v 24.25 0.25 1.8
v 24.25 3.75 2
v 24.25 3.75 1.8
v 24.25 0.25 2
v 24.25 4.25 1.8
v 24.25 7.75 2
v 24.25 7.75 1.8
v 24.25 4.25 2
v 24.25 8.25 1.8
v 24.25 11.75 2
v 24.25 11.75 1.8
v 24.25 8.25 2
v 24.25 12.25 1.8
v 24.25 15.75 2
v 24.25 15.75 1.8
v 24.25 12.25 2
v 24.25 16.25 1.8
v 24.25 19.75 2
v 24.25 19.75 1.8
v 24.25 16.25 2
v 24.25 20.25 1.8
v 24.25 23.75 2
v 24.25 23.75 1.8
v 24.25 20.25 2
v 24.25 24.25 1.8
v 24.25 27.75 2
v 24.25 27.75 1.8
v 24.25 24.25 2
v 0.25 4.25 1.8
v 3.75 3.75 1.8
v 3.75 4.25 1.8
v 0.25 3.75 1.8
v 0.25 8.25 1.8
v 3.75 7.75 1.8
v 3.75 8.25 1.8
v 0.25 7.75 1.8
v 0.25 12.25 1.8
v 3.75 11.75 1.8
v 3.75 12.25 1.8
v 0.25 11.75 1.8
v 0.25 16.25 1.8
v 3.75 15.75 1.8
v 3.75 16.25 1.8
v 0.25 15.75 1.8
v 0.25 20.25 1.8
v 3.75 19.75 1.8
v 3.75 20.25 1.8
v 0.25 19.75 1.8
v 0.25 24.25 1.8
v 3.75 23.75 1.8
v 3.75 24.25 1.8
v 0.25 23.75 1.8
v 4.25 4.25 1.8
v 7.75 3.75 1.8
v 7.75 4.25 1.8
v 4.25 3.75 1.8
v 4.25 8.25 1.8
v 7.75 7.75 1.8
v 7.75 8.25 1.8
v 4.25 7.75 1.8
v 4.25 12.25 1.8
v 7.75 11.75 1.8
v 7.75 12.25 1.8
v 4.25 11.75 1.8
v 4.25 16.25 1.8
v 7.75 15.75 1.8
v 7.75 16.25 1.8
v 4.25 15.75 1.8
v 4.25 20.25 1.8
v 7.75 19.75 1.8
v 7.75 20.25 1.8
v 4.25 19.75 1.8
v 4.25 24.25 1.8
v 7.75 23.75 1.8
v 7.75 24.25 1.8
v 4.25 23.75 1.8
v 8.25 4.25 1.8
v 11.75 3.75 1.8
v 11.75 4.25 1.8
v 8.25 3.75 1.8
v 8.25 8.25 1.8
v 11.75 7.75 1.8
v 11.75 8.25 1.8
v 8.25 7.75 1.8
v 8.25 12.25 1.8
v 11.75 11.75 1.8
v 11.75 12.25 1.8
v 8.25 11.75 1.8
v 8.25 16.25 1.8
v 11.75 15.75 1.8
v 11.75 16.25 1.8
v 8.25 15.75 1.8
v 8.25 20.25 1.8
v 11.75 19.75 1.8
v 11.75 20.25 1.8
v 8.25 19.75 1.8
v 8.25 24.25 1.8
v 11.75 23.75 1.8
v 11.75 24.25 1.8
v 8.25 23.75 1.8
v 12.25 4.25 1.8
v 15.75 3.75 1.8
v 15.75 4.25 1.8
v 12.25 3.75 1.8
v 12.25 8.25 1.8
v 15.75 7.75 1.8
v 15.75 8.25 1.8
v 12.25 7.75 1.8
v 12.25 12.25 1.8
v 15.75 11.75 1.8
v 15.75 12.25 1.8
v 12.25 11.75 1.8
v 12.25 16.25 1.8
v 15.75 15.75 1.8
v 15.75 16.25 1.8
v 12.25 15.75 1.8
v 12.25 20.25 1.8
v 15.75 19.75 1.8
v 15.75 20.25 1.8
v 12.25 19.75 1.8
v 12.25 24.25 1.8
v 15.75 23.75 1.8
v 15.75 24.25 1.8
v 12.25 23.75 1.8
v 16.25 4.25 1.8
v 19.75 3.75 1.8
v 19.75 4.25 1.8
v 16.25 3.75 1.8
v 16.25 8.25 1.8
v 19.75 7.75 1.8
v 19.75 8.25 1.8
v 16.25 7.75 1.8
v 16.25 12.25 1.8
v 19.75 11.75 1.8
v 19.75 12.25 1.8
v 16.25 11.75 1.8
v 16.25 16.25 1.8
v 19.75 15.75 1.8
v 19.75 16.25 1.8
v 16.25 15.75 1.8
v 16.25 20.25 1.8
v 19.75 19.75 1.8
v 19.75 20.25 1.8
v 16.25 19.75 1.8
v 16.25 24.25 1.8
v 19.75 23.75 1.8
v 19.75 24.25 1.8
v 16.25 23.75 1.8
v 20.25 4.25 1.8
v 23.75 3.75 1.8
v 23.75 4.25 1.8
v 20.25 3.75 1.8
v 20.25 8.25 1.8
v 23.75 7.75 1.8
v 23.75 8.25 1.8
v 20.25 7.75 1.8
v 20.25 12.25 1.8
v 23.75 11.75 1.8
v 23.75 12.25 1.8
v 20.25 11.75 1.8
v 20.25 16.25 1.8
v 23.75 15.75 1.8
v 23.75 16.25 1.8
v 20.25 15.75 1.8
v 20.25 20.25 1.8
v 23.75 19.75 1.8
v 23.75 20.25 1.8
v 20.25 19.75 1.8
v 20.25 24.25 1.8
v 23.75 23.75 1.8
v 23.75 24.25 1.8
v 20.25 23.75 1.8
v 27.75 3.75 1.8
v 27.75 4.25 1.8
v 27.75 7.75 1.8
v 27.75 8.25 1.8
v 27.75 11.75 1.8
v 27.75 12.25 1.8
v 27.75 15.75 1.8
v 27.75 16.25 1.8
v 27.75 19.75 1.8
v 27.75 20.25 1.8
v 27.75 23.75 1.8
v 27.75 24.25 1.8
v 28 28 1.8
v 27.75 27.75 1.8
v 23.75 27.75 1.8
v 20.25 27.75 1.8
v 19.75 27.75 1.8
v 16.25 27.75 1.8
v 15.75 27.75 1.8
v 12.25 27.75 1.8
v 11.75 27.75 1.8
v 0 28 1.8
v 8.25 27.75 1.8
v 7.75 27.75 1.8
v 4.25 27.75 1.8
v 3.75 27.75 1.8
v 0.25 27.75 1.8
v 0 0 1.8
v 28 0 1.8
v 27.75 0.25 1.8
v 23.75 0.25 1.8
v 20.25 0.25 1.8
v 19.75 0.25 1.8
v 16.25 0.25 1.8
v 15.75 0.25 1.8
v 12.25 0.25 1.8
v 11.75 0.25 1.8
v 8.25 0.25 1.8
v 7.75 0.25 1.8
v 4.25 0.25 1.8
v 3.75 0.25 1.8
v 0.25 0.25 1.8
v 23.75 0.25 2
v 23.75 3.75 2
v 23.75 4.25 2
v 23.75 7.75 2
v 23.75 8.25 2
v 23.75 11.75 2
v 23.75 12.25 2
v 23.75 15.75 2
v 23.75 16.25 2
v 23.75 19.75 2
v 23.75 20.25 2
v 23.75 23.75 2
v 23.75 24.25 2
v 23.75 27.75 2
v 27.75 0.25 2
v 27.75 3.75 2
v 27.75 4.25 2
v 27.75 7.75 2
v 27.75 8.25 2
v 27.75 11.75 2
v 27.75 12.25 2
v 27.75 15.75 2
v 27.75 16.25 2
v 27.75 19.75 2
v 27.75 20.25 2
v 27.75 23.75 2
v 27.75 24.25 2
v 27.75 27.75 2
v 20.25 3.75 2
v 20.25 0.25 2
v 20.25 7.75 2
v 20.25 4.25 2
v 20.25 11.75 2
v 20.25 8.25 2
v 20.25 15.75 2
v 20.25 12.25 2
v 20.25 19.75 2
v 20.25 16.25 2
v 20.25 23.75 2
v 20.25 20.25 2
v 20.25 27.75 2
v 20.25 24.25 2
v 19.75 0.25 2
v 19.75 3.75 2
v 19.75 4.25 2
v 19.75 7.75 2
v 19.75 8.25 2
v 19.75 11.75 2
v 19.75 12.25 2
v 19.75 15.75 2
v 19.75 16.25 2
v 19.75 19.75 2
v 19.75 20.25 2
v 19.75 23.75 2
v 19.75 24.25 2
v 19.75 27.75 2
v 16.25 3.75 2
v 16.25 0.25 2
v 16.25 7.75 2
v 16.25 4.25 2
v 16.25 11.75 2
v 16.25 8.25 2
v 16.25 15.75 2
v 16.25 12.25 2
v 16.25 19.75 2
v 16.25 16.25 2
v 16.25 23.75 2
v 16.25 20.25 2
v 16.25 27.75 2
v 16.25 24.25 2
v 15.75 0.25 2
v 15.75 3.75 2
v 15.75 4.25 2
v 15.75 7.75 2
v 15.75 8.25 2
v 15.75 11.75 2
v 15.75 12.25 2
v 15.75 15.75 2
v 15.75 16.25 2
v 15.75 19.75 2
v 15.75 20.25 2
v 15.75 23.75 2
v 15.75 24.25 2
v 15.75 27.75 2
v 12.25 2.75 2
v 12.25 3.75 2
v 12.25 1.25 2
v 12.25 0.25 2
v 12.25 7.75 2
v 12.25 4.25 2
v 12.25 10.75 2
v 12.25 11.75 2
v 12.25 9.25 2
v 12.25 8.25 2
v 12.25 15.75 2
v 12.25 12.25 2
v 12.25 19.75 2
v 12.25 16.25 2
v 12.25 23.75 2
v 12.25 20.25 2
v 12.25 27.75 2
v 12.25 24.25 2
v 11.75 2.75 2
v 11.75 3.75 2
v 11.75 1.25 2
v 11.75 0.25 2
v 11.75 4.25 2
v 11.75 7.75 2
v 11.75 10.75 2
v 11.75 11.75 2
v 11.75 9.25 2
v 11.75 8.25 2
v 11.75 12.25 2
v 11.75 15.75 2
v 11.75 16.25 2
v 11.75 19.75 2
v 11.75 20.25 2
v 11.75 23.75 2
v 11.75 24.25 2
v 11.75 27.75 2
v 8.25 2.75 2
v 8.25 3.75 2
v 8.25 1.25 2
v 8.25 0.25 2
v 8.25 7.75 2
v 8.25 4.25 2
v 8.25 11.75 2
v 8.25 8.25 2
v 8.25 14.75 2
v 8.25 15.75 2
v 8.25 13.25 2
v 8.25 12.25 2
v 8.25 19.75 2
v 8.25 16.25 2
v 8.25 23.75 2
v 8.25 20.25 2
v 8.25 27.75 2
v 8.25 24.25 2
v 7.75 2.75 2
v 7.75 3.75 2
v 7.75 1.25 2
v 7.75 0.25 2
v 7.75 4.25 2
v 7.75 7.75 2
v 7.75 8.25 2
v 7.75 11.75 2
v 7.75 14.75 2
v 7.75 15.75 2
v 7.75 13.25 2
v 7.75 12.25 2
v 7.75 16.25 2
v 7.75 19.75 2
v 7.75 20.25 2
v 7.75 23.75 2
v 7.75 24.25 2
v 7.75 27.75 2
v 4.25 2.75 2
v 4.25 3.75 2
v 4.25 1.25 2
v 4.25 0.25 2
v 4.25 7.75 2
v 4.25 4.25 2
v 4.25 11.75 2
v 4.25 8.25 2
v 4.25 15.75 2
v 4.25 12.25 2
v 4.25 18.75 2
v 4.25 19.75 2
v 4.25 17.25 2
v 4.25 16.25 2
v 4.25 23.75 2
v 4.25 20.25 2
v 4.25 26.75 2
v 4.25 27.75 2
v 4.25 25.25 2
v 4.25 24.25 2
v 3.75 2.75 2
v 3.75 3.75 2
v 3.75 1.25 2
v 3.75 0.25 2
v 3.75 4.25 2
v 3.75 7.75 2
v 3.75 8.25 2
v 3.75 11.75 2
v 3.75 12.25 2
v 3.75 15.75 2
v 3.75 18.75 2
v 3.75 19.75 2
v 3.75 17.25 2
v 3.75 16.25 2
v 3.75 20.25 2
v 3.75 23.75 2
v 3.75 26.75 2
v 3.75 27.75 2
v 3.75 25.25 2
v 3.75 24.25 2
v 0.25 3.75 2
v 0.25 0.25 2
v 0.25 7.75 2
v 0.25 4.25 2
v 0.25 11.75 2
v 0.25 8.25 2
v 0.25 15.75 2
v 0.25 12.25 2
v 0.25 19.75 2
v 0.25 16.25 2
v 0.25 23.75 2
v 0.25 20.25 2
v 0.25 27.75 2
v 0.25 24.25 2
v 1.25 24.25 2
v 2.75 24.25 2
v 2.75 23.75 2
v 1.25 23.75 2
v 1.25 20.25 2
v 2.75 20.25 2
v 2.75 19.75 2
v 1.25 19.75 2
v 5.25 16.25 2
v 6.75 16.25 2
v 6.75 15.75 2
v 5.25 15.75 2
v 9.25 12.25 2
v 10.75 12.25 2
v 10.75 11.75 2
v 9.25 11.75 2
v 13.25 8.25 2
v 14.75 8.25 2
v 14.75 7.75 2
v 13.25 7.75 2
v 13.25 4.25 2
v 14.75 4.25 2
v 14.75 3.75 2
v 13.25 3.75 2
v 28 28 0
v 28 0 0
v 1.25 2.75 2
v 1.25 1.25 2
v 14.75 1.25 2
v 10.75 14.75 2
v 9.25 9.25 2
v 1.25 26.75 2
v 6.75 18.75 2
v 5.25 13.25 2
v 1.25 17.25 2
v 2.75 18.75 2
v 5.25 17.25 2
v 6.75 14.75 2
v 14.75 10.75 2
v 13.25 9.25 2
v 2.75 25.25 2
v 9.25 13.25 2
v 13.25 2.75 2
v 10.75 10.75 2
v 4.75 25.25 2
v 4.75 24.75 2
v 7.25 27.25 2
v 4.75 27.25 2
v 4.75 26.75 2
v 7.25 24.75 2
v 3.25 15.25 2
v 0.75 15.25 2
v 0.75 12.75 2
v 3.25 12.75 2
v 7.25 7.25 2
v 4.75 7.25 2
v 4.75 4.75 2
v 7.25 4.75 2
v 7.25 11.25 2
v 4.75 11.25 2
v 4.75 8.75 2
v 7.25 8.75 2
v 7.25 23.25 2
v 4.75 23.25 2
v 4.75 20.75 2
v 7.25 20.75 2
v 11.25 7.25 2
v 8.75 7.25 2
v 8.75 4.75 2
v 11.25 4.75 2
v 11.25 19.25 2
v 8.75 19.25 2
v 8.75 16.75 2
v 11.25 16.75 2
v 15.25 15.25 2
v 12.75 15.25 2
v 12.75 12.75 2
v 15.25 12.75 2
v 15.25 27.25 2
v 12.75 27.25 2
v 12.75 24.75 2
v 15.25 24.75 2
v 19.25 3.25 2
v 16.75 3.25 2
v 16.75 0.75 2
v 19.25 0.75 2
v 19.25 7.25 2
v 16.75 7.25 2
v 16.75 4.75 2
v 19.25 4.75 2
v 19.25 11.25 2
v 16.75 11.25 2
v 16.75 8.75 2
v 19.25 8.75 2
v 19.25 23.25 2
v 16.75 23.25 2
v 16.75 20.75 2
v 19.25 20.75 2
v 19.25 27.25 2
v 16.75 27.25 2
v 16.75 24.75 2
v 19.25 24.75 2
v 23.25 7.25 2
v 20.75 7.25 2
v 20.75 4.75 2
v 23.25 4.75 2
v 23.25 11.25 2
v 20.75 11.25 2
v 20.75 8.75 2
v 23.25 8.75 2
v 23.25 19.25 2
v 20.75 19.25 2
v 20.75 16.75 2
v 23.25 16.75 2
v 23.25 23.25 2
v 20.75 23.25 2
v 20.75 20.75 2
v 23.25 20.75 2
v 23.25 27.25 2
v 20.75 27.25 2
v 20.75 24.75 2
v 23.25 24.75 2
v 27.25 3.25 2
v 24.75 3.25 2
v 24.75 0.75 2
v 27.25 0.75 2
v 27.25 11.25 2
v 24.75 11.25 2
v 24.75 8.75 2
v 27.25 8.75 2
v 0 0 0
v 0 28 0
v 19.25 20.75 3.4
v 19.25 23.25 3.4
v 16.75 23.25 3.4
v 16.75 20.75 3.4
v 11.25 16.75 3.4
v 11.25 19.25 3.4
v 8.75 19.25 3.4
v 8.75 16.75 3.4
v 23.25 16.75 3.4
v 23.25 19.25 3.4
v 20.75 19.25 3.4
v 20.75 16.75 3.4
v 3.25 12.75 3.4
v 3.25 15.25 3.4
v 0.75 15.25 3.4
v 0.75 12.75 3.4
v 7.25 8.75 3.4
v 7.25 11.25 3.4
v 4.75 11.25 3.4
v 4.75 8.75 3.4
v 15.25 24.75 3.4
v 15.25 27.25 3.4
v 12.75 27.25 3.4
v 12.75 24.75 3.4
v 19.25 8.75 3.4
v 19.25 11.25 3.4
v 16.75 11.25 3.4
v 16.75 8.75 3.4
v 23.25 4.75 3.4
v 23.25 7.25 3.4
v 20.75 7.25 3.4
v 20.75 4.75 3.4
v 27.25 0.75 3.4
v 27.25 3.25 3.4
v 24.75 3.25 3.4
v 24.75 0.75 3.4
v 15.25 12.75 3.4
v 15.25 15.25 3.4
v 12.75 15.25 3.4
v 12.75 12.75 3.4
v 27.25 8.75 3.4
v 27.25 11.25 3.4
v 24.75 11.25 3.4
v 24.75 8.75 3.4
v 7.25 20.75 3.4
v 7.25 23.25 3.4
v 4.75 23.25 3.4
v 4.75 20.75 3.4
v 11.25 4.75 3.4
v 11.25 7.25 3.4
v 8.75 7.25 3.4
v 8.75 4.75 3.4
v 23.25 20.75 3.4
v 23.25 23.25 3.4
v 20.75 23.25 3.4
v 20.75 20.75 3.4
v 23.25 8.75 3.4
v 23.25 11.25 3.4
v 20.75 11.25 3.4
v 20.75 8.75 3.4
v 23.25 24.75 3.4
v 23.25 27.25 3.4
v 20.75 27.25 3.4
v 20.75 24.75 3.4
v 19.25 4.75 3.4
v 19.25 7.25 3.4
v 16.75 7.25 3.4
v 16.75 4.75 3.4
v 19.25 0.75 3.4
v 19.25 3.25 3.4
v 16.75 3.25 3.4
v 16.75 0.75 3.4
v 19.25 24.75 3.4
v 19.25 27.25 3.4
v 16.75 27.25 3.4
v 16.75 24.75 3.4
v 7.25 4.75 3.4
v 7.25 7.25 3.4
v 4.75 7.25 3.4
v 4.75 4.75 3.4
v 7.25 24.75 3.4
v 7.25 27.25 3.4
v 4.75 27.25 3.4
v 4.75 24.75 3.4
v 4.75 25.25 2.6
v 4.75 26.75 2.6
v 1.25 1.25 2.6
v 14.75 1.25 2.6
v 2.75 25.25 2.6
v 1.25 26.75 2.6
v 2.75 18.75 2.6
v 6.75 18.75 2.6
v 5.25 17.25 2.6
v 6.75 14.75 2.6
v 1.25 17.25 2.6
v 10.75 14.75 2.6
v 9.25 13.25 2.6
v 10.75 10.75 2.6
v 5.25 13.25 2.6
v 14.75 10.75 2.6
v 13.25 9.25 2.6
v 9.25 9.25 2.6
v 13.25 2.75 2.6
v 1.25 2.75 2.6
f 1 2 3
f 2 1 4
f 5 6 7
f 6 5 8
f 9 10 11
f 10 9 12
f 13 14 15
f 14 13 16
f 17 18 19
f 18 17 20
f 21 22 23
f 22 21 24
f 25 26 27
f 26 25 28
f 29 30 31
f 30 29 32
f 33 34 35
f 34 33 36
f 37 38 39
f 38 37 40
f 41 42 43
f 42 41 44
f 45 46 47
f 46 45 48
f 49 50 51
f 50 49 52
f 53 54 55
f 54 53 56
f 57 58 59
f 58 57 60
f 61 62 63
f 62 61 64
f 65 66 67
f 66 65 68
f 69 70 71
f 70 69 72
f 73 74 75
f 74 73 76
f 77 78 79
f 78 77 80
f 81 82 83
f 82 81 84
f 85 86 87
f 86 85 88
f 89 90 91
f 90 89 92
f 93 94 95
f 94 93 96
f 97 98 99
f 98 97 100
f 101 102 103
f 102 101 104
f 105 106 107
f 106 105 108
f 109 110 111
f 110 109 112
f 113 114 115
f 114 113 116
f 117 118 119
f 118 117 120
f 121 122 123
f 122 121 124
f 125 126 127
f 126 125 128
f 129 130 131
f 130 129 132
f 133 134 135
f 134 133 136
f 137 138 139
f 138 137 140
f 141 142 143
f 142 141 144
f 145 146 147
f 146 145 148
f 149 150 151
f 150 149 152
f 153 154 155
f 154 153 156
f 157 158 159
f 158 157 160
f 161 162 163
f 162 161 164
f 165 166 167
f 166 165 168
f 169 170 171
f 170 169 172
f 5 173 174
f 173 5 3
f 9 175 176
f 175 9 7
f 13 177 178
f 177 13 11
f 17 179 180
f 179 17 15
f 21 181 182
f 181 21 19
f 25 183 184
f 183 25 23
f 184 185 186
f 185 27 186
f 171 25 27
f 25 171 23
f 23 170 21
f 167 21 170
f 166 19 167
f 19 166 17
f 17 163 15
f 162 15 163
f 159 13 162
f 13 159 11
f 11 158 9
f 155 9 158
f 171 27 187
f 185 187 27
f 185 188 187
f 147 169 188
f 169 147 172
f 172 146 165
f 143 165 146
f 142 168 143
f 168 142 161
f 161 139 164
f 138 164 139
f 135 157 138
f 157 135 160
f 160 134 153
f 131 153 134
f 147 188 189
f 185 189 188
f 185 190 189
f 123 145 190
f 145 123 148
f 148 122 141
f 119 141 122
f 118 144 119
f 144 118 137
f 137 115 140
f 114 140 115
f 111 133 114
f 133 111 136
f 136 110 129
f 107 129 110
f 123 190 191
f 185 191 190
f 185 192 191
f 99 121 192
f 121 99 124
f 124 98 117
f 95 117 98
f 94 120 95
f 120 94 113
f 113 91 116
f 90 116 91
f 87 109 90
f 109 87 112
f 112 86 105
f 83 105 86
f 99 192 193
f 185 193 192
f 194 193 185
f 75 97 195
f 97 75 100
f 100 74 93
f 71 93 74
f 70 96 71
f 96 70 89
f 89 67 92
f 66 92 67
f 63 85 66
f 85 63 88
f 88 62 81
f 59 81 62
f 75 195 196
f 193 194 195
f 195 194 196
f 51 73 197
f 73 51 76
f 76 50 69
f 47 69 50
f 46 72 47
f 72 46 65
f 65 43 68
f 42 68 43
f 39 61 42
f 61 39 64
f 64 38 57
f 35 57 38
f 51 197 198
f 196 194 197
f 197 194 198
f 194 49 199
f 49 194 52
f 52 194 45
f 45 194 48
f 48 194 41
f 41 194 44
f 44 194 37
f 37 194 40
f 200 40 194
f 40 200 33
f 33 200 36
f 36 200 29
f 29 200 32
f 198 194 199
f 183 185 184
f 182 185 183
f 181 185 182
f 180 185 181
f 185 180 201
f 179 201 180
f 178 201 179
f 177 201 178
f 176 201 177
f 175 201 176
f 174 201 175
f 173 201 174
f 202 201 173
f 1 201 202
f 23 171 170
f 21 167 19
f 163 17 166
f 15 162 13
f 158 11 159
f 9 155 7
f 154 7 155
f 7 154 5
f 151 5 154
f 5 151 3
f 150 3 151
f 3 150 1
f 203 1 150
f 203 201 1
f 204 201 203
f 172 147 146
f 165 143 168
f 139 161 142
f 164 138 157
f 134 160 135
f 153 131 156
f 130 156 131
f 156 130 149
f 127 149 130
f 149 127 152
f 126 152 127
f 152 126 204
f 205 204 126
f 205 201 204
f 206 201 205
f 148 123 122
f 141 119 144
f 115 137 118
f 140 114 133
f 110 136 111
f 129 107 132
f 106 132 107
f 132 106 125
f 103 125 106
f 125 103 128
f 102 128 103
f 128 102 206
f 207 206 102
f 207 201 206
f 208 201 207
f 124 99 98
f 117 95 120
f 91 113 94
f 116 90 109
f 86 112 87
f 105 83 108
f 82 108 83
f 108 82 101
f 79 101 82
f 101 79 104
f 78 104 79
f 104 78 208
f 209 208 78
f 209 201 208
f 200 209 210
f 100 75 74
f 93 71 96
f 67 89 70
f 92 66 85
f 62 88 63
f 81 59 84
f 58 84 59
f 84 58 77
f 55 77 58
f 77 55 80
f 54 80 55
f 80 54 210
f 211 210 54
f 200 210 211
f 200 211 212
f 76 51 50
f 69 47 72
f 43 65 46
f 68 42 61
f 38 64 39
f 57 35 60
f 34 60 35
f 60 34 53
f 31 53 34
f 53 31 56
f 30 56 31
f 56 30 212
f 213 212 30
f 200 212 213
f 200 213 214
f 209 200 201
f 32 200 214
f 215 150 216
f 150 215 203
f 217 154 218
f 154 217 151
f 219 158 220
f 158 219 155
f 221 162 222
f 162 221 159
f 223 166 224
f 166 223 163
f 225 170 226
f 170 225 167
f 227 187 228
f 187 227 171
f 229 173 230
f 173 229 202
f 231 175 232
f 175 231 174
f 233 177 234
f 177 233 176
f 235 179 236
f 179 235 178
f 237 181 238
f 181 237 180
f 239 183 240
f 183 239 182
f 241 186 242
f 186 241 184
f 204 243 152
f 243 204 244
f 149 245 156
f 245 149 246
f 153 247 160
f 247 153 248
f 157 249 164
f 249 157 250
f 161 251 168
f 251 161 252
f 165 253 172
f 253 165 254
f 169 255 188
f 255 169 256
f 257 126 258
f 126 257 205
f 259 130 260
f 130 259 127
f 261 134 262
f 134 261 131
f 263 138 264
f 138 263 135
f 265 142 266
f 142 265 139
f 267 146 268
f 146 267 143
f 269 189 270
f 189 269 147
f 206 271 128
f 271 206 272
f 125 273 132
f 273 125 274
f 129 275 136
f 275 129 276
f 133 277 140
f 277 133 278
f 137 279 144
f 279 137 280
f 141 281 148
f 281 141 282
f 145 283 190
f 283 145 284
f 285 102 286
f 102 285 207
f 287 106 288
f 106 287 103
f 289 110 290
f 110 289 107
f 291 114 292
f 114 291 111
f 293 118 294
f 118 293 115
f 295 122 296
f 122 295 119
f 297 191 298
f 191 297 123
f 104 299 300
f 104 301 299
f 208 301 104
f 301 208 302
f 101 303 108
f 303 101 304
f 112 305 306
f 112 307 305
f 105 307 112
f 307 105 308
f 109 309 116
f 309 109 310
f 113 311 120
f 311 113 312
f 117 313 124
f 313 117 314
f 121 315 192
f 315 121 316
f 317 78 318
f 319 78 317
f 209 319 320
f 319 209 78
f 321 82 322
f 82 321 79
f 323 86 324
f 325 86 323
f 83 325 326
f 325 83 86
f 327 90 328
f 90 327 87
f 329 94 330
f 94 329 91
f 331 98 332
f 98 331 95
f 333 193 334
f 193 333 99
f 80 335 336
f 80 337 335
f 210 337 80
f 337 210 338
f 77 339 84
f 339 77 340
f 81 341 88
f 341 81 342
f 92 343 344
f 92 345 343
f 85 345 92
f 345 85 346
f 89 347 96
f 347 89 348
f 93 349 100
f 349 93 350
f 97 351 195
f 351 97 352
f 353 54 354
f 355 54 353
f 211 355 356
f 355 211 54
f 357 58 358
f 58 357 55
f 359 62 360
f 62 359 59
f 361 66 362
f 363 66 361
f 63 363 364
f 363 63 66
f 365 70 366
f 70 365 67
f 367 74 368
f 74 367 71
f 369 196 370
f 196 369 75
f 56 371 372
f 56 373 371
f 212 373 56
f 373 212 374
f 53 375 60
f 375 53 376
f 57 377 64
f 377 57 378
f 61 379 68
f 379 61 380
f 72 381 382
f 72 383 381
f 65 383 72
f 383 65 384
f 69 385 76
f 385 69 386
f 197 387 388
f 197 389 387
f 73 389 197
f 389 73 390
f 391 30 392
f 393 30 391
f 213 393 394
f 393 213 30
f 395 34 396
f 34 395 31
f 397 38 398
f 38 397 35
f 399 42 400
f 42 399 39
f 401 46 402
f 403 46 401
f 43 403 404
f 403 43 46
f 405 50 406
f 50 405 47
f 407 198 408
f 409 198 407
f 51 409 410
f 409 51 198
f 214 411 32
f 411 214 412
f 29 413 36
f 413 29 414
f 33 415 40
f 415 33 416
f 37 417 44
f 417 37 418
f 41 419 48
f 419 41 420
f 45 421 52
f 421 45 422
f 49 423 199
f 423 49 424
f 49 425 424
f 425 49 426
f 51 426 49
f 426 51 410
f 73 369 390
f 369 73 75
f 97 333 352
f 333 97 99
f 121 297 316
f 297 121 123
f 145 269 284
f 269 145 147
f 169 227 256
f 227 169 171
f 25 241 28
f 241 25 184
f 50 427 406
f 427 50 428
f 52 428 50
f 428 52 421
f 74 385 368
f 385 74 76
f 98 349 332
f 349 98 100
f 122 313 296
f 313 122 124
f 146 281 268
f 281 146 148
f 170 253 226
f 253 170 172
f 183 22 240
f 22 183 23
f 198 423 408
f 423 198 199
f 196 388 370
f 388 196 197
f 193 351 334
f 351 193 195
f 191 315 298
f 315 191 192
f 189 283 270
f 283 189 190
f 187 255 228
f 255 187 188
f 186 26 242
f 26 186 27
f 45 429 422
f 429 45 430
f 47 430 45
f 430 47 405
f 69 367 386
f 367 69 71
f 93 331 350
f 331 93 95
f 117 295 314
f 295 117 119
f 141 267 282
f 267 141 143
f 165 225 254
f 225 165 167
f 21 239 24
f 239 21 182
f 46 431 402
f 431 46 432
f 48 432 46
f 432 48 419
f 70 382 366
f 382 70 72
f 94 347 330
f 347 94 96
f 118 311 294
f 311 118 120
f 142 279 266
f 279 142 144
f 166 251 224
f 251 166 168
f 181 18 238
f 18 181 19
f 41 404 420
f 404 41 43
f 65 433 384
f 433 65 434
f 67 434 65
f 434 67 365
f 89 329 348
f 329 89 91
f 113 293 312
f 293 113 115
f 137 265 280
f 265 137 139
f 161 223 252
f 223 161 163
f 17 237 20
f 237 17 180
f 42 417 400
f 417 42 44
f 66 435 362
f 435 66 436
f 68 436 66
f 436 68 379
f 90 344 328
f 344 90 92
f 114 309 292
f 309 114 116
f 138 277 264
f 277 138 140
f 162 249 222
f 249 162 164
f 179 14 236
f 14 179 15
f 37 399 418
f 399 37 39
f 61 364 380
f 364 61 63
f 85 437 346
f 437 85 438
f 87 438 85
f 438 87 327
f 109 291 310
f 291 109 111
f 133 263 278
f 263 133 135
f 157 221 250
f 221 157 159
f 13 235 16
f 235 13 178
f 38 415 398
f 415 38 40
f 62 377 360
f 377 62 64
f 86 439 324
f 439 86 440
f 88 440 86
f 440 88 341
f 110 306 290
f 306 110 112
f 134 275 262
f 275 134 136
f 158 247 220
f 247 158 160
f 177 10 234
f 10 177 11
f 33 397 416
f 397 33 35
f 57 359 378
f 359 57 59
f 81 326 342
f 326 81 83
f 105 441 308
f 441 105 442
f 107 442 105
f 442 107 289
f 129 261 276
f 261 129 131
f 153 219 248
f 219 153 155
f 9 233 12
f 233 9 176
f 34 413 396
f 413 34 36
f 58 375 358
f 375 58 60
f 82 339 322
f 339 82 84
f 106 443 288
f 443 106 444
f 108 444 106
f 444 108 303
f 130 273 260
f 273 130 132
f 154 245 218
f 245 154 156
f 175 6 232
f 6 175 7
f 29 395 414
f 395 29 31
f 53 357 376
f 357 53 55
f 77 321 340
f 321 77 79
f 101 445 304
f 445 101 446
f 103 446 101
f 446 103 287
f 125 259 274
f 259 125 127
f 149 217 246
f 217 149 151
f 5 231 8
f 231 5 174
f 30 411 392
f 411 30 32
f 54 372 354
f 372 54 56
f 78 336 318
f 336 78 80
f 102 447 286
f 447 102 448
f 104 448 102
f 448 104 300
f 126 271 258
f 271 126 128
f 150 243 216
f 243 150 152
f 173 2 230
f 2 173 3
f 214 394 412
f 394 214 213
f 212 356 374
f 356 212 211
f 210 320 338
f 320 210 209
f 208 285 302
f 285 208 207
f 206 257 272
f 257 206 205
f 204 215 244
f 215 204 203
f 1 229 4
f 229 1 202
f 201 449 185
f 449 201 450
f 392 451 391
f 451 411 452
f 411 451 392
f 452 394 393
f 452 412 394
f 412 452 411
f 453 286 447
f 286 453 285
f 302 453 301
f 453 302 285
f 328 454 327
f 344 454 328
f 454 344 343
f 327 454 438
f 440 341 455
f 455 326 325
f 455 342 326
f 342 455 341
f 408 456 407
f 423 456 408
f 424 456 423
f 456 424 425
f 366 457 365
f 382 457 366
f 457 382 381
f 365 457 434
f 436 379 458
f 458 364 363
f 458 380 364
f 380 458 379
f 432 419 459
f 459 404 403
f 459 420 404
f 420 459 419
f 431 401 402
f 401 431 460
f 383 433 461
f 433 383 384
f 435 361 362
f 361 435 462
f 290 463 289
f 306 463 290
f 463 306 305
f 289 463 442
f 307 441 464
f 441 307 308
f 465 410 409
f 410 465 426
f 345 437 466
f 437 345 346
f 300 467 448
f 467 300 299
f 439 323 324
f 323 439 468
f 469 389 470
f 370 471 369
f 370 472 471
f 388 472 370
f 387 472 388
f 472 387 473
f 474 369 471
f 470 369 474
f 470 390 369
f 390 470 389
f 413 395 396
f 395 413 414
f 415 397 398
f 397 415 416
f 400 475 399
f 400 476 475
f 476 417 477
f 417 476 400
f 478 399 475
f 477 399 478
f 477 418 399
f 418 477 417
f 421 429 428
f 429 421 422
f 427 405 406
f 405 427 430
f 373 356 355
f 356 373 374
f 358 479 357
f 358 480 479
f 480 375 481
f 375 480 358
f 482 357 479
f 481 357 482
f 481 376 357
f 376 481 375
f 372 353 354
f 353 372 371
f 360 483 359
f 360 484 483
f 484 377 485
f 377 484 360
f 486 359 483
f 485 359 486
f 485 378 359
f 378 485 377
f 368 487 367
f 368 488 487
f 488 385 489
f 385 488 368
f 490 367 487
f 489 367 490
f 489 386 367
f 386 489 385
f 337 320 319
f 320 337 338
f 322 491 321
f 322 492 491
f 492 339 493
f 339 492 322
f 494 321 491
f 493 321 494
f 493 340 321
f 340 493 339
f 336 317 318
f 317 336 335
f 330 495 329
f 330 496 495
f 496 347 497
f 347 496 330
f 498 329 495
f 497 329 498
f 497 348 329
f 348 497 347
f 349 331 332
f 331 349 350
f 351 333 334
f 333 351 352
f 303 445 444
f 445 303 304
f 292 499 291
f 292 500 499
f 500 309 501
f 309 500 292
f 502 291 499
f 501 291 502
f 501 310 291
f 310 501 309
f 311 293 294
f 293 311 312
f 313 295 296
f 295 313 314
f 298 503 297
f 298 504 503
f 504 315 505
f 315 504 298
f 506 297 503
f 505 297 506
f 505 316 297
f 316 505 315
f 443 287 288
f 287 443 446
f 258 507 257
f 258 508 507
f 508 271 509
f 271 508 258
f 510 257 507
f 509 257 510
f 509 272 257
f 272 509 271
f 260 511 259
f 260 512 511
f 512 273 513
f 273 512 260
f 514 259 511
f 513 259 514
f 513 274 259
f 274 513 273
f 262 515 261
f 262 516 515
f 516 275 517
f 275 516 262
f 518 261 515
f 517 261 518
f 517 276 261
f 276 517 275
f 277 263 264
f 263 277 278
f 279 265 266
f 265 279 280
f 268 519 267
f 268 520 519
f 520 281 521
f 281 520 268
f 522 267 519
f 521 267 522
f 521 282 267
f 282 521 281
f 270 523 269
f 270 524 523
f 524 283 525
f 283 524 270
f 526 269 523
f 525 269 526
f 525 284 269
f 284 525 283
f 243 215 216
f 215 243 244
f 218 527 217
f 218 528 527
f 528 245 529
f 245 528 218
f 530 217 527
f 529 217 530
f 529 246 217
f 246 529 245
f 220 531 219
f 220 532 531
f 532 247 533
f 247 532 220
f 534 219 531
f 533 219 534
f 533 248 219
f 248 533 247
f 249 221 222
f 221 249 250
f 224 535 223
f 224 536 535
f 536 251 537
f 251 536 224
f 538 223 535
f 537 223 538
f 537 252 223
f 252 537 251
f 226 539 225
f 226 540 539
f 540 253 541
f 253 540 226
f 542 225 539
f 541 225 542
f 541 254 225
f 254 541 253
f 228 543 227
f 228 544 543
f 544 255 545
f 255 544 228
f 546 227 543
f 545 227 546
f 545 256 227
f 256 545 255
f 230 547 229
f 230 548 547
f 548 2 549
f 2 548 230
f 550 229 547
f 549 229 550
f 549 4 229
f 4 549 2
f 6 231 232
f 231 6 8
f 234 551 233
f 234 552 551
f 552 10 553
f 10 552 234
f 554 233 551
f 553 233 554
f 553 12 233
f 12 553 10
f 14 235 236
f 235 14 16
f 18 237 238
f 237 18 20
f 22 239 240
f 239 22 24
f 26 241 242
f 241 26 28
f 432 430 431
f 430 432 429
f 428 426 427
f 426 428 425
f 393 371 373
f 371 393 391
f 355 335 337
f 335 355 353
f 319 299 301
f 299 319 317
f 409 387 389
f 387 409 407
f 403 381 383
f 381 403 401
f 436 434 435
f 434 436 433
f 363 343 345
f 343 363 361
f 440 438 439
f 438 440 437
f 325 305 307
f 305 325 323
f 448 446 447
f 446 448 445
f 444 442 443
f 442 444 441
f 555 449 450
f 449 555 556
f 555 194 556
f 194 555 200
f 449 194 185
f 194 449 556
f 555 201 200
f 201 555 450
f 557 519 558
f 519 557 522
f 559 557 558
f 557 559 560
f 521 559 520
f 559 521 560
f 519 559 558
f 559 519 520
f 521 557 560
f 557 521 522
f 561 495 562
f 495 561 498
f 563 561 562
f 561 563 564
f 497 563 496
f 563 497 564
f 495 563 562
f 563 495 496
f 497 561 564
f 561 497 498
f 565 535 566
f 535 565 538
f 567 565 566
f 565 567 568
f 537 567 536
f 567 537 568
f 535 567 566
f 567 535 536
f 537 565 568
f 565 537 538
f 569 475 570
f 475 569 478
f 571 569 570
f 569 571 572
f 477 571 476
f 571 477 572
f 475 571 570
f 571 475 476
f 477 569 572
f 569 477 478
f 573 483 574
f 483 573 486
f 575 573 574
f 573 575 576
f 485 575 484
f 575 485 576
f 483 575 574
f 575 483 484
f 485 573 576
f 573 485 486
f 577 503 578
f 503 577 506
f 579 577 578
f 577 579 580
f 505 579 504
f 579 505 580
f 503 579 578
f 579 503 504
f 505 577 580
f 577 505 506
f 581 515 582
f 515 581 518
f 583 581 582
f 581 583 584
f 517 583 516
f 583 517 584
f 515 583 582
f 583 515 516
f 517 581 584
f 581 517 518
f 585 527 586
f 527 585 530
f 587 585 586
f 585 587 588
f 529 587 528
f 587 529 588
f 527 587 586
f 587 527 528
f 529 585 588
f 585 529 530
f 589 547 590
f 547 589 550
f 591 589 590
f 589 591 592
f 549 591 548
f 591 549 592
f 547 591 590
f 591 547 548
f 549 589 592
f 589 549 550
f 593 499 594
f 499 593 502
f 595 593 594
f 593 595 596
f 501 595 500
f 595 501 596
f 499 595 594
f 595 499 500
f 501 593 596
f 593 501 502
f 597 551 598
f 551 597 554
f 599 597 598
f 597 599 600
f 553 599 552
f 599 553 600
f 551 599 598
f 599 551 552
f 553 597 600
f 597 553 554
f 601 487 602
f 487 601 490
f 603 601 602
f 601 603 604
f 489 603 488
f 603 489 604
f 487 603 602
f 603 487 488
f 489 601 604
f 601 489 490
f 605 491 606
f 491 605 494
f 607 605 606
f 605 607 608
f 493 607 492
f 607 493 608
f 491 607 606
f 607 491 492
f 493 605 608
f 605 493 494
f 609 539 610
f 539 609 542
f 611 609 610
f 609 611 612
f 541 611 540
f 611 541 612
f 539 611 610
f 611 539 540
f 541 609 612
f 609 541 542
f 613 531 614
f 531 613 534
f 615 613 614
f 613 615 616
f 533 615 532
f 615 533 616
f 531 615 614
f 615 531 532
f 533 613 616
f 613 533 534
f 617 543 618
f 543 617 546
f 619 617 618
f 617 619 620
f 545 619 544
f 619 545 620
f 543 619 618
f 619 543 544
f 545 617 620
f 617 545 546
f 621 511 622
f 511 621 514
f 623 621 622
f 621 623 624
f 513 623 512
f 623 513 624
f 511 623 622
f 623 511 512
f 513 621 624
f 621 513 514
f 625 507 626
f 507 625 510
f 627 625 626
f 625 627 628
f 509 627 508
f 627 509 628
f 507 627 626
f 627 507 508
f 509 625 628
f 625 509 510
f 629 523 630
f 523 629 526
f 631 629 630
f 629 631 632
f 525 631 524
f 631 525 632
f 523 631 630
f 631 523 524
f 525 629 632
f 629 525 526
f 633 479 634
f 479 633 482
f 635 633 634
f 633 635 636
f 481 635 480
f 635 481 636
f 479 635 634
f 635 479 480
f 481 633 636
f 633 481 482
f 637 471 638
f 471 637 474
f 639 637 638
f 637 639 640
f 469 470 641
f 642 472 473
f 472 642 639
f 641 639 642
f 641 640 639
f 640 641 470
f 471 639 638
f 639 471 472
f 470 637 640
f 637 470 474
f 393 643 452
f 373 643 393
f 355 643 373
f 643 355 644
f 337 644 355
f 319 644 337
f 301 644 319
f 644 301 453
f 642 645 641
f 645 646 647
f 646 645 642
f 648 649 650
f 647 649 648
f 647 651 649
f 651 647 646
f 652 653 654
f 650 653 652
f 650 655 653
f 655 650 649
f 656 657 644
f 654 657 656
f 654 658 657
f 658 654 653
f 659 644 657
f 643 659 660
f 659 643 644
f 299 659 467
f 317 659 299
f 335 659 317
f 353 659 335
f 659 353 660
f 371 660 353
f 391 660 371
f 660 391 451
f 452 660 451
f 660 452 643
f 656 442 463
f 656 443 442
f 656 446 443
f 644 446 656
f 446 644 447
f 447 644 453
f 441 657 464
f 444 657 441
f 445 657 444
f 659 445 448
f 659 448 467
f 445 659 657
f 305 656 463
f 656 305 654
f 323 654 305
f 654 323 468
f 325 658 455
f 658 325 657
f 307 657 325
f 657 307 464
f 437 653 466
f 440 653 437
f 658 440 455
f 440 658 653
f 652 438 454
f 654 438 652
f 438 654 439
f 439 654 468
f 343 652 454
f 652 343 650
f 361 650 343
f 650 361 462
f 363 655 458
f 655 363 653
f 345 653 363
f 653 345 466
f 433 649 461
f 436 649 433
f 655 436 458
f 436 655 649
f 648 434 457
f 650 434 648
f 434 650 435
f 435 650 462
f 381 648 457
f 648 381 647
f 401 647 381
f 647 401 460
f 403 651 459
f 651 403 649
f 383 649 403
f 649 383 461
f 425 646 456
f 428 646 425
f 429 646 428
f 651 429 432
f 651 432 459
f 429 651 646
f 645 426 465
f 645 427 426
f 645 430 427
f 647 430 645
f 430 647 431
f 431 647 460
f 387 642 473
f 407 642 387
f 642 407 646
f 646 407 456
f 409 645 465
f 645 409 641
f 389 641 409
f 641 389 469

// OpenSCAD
//==================================================================================
//
//               Advent Of Code 2024 - Day 18 - Visualisation
//
// Author:  Heath Raftery
// Origin:  https://github.com/hraftery/aoc2024/blob/main/src/days/day18.scad
// License: Creative Commons - Attribution - Share Alike
//
// See Reddit for discussion: https://www.reddit.com/r/adventofcode/comments/1hhln7j/2024_day_18_part_2_openscad_into_the_third/
//
//==================================================================================


//===========
// Constants
//===========

//NOTE: width is in y direction, length is in x direction, height is in z direction
//      thickness is in direction perpendicular to its length.
base_h = 2;
wall_t = 0.5;
wall_h = -0.2;
cell_w = 4;
cell_l = cell_w;
byte_w = 2.5;
byte_l = byte_w;
byte_h = 1.4;
path_t = 1.5;
path_h = 0.6;
blocker_h = 4;
tol = 0.001;


//========
//  Data
//========

//NOTE: To put the OpenSCAD orgin at the top left, the x and y axes swapped.
//      So num_cols is in the OpenSCAD y direction and locs are interpreted in [y,x] order.
example = true;
num_cols = example ? 7 : 71;
num_rows = num_cols;
byte_locs = example ?
  [ [5,4], [4,2], [4,5], [3,0], [2,1], [6,3], [2,4], [1,5], [0,6], [3,3], [2,6], [5,1], [1,2], [5,5], [2,5], [6,5], [1,4], [0,4], [6,4], [1,1], [6,1] ] :
  [ /* your input data here */ ];
path_locs = example ?
  [ [0,0], [0,1], [0,2], [0,3], [1,3], [2,3], [2,2], [3,2], [3,1], [4,1], [4, 0], [5, 0], [6, 0], [6, 1] ] :
  [ /* your calculated path here */ ];


//===========
// Functions
//===========

function arg(p0, p1) = atan2(p1[1]-p0[1], p1[0]-p0[0]);


//=========
// Modules
//=========

module walls(t, h) {
  intersection() {
    union() {
      walls_w(t, h, 0);
      walls_l(t, h, 0);
    }
    translate([-tol, -tol, -tol])
      cube([num_rows*cell_l + 2*tol, num_cols*cell_w + 2*tol, h + 2*tol]);
  }
}

module walls_w(t, h, index) {
  translate([-t/2, -tol, 0])
    cube([t, num_cols*cell_w + 2*tol, h+tol]);
  if(index < num_rows) {
    translate([cell_l, 0, 0])
      walls_w(t, h, index + 1);
  }
}

module walls_l(t, h, index) {
  translate([-tol, -t/2, 0])
    cube([num_rows*cell_l + 2*tol, t, h+tol]);
  if(index < num_cols) {
    translate([0, cell_w, 0])
      walls_l(t, h, index + 1);
  }
}

module bytes(w, l) {
  for(loc=byte_locs) {
    translate([loc[1]*cell_l + cell_l/2 - byte_l/2,
               loc[0]*cell_w + cell_w/2 - byte_w/2,
               0])
      cube([byte_l, byte_w, byte_h]);
  }
}

module path(t, index=0, in=false) {
  for(i=[0:len(path_locs)-2]) {
    translate([path_locs[i][1]*cell_l + cell_l/2,
               path_locs[i][0]*cell_w + cell_w/2,
               0])
      rotate([0, 0, -arg(path_locs[i], path_locs[i+1])])
        translate([-t/2, -t/2, 0])
          cube([t, cell_w + t, path_h]);
  }
}


//========
//  Main
//========

union() {
  if(wall_h < 0)
    difference() {
      cube([num_rows*cell_l, num_cols*cell_w, base_h]);
      translate([0, 0, base_h+wall_h])
        walls(wall_t, -wall_h);
  }
  else
    union() {
      cube([num_rows*cell_l, num_cols*cell_w, base_h]);
      translate([0, 0, base_h])
        walls(wall_t, wall_h);
  }
  
  translate([0, 0, base_h])
    bytes(byte_w, byte_h);

  translate([0, 0, base_h])
    path(path_t);
}
